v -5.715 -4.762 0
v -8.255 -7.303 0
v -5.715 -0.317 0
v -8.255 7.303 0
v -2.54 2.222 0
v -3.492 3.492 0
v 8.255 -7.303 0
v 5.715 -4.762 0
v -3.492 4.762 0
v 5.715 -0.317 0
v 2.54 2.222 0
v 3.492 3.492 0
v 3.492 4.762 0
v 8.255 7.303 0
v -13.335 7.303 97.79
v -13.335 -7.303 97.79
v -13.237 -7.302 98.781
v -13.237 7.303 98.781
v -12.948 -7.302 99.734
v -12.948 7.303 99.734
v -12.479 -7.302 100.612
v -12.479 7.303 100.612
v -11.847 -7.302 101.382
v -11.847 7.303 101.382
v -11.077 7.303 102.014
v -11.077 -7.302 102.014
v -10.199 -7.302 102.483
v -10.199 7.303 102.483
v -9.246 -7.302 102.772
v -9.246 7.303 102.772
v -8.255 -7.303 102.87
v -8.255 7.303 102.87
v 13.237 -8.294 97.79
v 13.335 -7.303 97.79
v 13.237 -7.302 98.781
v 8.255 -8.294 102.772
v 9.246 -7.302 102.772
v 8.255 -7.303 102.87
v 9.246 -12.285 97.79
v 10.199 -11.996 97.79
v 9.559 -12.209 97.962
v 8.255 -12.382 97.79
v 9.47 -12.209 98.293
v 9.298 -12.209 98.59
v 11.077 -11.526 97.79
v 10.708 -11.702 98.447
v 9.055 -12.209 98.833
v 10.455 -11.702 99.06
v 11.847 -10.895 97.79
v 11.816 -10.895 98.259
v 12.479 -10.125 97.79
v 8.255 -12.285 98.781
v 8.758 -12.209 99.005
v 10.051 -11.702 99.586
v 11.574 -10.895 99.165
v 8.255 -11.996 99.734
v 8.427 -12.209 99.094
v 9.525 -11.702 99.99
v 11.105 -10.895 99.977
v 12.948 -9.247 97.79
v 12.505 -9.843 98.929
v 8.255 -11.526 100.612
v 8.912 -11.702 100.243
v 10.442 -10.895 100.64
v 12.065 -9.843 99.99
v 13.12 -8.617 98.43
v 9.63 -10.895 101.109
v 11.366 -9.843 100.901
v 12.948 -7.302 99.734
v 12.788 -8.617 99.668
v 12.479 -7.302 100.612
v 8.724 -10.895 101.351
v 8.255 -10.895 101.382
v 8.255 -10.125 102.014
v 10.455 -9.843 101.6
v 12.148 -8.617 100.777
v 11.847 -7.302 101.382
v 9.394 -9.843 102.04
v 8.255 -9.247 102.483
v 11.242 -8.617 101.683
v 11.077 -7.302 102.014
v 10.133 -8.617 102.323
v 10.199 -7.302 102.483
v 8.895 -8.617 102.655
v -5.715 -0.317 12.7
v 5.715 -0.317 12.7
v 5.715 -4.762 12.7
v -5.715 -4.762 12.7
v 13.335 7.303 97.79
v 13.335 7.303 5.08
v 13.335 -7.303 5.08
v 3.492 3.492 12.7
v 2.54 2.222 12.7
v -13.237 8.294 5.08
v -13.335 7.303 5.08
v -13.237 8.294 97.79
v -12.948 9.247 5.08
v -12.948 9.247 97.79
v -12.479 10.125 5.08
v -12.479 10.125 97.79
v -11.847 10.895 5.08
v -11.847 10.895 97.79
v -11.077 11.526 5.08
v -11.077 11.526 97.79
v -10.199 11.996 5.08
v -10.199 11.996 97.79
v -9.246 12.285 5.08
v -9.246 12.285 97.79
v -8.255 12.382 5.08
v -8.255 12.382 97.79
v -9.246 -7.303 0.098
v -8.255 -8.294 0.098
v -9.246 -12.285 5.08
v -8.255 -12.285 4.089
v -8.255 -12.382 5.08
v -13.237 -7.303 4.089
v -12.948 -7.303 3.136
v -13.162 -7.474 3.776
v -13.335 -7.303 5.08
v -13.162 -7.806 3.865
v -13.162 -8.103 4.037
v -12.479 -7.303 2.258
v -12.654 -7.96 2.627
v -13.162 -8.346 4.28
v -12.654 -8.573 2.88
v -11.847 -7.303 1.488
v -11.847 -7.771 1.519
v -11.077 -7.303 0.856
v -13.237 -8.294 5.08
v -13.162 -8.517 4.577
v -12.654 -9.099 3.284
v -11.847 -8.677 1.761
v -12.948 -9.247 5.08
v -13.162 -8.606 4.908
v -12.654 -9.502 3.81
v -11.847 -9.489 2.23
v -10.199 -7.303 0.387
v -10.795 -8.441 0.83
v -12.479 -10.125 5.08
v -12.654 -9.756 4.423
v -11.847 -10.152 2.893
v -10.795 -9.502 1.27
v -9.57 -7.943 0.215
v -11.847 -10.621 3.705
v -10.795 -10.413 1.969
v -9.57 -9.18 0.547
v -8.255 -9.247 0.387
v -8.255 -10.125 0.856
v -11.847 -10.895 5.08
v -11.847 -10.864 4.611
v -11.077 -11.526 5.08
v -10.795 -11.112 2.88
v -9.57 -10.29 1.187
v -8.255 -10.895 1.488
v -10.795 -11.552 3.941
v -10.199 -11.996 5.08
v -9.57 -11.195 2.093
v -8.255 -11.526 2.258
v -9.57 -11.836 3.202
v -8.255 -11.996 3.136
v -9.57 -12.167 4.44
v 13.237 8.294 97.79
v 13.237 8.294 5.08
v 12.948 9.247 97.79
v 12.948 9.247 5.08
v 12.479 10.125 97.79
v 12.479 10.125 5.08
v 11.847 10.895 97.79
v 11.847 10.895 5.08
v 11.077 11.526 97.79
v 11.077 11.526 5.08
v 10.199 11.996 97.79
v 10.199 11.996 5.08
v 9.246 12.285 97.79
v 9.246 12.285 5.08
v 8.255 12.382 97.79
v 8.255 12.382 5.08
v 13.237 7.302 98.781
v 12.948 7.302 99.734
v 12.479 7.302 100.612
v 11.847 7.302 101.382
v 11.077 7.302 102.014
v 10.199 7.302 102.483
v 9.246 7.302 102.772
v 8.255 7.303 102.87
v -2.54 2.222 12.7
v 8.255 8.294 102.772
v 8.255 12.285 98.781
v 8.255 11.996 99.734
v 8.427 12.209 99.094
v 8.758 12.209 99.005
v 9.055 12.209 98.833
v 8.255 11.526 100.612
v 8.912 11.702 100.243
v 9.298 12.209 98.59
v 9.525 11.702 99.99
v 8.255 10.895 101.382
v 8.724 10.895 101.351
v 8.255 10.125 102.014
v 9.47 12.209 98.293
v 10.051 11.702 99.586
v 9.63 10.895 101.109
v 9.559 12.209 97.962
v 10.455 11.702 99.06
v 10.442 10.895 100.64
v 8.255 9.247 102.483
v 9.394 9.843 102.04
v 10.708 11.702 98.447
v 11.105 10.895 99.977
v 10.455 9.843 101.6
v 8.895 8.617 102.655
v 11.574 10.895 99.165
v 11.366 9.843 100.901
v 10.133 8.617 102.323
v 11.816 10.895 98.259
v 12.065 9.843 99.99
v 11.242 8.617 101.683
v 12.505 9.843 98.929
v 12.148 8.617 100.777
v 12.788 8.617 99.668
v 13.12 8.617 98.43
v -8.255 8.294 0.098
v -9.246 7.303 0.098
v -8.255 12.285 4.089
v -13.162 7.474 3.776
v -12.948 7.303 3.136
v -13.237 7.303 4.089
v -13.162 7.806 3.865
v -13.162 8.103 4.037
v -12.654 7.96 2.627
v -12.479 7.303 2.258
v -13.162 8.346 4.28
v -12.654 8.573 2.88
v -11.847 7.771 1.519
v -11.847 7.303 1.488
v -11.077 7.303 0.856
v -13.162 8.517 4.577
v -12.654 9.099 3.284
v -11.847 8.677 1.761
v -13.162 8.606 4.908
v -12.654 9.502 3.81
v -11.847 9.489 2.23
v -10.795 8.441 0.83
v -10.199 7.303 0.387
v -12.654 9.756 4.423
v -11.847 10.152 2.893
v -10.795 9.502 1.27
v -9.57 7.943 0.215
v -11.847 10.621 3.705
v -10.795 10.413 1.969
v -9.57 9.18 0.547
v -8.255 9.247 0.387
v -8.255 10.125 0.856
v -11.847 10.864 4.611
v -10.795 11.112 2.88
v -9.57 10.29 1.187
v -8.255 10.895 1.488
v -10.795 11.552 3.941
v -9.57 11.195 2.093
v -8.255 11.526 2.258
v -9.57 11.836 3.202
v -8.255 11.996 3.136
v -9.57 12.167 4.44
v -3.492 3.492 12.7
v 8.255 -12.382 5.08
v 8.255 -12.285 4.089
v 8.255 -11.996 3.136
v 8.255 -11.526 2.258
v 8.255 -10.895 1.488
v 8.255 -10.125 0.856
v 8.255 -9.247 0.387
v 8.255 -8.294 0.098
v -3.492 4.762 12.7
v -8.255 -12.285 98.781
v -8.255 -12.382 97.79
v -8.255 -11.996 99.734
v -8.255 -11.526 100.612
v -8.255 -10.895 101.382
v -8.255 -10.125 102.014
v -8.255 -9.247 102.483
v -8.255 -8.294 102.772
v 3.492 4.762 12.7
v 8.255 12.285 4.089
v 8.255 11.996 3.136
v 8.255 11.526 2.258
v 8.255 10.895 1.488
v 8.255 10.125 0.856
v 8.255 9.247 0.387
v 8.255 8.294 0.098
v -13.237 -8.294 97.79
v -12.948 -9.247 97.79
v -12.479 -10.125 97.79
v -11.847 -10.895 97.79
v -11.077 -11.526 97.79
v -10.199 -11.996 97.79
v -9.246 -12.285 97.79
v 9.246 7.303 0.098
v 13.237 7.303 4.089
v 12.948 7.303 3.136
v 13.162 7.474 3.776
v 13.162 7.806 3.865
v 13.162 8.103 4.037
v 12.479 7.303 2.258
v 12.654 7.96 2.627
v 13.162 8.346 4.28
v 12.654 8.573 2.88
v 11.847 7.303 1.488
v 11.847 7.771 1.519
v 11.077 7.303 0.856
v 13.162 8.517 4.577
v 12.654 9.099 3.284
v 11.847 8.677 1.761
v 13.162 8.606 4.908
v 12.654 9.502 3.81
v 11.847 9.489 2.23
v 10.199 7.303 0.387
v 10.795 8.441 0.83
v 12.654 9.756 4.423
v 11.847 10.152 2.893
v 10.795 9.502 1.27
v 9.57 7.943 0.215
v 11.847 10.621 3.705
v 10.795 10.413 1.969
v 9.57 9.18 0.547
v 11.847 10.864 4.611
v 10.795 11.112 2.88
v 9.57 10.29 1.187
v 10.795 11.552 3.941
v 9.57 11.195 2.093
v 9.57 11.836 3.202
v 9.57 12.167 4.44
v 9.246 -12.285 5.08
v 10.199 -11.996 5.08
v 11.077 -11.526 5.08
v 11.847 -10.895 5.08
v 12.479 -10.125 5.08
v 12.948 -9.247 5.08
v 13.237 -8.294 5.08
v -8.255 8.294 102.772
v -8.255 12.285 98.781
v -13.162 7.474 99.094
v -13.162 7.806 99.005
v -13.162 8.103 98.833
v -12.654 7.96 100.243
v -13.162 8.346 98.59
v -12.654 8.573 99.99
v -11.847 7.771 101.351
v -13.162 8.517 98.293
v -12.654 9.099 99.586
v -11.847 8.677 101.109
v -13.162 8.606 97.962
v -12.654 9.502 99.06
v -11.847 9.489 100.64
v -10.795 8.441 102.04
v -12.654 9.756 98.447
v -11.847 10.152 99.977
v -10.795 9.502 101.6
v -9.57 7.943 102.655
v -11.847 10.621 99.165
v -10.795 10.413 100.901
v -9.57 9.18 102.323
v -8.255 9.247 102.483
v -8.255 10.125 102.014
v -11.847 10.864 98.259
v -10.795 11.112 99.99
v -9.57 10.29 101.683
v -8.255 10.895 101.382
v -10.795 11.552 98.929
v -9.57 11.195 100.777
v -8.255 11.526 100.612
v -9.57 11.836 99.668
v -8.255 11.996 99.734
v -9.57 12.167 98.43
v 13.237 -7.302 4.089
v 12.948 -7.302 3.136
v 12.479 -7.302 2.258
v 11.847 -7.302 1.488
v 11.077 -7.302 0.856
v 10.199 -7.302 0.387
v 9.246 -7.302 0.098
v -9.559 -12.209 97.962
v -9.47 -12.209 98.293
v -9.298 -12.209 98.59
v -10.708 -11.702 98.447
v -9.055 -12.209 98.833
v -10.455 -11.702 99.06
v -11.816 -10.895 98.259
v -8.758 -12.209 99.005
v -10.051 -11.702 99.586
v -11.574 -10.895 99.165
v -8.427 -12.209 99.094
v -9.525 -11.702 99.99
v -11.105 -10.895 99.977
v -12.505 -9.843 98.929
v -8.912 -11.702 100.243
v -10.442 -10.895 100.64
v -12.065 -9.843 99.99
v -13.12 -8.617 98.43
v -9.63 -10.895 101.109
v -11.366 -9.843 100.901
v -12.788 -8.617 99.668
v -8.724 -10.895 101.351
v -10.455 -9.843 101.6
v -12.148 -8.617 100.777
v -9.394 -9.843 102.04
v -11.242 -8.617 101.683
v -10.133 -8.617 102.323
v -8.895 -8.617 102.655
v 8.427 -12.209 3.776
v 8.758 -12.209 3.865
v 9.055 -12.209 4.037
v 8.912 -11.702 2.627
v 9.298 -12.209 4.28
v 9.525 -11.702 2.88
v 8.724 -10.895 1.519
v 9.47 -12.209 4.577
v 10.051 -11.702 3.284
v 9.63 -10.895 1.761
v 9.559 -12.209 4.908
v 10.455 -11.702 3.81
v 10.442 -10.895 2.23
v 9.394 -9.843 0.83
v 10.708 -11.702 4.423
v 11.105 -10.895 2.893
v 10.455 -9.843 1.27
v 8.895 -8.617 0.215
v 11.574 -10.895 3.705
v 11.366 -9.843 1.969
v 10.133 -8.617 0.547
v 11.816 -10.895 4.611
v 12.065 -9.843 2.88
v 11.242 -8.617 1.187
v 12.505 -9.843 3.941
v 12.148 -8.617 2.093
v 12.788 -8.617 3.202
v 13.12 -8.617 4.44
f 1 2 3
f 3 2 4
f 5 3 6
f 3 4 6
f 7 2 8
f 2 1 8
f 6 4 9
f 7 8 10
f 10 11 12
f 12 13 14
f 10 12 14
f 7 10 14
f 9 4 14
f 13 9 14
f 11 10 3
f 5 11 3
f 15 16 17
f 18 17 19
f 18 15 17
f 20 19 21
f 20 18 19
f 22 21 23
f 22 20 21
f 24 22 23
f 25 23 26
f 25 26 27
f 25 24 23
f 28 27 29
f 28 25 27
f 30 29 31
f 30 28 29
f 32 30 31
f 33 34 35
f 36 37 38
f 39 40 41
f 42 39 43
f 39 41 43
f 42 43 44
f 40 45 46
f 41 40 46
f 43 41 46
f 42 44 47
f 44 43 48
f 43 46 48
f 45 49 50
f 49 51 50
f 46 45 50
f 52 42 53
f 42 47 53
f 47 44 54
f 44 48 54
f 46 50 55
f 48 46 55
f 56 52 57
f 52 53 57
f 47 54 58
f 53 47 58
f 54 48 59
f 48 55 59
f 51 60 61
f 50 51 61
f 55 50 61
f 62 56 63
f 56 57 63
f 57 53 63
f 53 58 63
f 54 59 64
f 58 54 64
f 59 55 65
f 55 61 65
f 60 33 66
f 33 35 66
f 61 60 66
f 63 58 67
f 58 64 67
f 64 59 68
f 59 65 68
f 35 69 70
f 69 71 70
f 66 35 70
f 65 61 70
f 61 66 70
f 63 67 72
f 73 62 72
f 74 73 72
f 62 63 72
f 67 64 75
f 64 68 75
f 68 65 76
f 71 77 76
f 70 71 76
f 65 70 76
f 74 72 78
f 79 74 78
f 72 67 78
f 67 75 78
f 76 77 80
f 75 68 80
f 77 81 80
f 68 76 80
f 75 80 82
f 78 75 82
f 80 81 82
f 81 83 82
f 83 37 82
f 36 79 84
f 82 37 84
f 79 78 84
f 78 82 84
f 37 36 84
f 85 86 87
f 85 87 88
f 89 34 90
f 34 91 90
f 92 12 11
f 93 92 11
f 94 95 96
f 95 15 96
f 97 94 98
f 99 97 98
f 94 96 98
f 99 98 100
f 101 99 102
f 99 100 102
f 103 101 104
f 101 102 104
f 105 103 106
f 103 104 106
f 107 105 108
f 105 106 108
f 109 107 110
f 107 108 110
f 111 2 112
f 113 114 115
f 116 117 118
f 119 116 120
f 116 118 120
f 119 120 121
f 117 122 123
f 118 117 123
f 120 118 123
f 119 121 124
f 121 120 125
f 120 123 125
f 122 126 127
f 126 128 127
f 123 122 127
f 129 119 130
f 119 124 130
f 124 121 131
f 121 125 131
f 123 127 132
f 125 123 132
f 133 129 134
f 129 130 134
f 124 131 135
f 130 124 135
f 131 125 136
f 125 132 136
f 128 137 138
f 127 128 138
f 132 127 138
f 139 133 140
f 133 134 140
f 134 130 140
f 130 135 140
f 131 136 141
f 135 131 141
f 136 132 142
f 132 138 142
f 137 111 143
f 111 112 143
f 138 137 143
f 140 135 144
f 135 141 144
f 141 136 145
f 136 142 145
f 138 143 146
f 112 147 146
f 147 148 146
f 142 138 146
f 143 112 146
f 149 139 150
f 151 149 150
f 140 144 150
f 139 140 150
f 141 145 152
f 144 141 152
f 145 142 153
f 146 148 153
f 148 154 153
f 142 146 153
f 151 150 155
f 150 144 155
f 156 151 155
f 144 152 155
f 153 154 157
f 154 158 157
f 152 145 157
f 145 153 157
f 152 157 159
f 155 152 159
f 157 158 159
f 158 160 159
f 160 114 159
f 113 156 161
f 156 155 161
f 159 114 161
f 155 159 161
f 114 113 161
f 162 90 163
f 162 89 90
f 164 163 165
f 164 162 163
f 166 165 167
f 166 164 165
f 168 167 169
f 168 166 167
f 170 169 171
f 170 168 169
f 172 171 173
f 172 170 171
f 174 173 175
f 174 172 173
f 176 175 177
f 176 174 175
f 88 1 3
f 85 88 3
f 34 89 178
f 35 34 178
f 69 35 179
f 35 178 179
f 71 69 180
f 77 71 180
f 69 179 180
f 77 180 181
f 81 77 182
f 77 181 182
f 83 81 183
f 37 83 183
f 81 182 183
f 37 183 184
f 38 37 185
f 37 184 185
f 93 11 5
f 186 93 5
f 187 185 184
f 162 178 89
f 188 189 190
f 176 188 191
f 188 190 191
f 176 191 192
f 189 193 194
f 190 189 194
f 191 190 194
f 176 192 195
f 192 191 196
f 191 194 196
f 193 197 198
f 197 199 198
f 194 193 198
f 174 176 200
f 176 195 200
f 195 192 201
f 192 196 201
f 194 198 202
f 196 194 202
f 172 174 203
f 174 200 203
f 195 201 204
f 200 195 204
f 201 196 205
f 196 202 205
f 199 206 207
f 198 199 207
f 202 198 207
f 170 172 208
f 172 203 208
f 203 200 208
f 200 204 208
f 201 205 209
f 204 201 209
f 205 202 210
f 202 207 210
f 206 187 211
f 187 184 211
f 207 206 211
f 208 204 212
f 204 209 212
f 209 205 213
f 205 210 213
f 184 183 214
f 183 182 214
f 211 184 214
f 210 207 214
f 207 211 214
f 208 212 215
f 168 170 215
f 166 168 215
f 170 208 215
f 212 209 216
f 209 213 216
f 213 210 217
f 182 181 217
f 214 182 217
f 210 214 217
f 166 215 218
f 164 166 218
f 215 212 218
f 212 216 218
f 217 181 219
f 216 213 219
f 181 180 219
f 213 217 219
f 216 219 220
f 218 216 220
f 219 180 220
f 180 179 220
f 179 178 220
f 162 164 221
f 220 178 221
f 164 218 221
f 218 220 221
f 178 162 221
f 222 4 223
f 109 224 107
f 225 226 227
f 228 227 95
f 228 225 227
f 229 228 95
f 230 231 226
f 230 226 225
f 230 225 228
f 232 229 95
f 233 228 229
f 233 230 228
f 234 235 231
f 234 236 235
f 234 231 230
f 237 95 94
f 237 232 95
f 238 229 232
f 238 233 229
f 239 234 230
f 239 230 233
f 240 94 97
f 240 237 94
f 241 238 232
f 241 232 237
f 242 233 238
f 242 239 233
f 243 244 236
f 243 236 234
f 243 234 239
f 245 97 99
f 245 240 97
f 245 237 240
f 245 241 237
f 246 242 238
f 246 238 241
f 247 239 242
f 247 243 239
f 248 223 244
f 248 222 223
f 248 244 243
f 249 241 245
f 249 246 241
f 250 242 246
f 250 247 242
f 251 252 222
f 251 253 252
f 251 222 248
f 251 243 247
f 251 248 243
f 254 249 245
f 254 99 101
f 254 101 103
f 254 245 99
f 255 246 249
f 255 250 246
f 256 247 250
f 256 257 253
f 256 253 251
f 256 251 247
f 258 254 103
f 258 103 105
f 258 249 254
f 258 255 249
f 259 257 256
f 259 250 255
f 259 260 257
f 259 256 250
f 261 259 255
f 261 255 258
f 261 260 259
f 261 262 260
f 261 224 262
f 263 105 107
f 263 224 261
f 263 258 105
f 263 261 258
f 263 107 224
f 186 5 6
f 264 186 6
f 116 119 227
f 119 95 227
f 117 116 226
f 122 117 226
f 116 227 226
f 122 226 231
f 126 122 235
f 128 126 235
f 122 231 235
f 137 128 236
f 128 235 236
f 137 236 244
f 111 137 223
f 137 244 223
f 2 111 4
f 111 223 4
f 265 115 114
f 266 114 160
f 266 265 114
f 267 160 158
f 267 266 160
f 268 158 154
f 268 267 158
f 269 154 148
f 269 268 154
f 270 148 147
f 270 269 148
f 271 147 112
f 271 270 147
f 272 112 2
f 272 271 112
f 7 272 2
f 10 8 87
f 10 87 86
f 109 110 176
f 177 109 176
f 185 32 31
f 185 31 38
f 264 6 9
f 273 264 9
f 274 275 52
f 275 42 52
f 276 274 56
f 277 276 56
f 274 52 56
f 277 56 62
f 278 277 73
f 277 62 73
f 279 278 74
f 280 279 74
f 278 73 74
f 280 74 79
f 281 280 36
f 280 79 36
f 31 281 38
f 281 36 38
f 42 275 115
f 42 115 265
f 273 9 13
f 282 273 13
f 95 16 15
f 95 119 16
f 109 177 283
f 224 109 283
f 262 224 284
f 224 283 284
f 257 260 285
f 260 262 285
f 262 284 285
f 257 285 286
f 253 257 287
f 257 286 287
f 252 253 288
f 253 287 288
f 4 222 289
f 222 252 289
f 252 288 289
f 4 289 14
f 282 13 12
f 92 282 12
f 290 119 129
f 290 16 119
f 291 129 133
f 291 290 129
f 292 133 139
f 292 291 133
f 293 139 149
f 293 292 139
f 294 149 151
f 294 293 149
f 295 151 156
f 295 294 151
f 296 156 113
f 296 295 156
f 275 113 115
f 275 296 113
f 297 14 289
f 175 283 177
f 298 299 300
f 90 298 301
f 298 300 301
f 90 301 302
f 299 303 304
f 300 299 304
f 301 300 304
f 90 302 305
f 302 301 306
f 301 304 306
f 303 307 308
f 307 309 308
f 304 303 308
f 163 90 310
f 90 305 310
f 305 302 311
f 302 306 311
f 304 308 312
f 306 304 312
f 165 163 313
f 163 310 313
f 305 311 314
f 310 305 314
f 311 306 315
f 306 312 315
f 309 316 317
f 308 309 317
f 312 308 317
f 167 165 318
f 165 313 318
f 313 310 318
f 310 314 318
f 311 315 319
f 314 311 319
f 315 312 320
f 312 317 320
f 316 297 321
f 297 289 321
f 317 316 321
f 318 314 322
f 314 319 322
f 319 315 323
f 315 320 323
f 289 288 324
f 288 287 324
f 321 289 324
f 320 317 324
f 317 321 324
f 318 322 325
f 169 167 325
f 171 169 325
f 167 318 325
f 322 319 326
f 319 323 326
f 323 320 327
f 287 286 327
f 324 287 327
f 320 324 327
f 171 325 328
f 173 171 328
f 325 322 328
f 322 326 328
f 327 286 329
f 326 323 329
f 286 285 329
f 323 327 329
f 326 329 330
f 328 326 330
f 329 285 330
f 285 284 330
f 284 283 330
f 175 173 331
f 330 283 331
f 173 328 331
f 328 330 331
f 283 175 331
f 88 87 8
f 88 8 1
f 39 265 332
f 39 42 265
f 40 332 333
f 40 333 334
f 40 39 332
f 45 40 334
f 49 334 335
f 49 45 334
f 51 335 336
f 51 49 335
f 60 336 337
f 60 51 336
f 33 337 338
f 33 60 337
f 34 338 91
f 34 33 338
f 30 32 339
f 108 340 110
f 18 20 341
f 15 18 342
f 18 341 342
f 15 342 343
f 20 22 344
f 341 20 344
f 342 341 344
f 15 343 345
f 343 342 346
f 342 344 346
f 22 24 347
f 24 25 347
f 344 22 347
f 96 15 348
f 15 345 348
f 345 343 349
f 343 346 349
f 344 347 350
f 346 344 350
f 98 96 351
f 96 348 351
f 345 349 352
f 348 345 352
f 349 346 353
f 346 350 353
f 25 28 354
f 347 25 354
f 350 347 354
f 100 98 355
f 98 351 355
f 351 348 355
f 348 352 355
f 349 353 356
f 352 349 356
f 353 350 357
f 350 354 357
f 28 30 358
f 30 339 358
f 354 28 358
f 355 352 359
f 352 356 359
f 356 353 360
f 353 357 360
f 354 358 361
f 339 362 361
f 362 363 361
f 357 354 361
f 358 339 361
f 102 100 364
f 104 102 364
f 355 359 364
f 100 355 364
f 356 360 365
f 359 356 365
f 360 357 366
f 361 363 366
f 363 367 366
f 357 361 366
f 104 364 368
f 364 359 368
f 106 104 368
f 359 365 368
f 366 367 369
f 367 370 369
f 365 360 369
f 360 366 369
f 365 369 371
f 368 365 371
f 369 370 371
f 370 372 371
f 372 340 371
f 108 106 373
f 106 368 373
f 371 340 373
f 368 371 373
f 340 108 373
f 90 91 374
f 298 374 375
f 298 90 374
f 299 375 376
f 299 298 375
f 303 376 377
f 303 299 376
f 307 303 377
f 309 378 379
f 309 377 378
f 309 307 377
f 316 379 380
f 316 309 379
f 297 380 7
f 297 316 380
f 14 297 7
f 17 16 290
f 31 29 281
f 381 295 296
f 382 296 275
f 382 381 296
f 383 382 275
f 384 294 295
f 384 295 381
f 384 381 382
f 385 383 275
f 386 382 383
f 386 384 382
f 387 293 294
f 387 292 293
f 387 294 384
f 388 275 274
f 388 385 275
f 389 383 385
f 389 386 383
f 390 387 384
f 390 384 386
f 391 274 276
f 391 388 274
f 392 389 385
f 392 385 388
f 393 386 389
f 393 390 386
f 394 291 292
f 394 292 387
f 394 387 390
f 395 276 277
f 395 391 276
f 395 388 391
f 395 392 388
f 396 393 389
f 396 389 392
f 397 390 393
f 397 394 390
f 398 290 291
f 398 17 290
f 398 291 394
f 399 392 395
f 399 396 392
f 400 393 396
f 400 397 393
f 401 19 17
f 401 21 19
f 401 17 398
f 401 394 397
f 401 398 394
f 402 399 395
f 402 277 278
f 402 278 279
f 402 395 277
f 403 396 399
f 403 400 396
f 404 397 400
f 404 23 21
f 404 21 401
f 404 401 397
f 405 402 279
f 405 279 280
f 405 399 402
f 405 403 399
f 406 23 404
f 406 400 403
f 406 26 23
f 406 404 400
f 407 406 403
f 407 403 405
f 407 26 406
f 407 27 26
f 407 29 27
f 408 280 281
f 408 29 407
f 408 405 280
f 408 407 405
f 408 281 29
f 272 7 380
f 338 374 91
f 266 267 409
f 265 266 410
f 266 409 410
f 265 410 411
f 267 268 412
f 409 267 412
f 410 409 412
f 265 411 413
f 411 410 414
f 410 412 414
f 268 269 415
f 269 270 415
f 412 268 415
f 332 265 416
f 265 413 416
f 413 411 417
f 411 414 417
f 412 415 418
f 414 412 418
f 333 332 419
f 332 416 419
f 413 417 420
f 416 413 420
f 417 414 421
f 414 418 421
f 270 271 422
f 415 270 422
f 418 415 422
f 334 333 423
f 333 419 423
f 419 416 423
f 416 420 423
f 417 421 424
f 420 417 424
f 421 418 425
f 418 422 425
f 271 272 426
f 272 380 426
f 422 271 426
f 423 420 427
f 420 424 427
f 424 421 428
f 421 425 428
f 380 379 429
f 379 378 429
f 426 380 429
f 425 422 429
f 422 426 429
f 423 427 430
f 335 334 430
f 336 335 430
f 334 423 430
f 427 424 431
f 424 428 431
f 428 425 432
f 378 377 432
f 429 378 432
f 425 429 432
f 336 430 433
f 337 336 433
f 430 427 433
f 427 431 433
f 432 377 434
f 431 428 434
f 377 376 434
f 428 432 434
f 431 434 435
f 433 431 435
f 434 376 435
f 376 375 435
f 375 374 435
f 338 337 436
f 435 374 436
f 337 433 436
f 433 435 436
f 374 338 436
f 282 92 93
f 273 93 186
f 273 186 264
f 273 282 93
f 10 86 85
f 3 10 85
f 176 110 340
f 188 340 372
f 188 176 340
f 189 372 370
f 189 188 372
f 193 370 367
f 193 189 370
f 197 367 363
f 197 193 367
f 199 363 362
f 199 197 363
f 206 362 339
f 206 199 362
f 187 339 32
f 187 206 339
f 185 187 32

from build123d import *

# Parameters (mm, degrees)
SKETCH1_W           = 26.67
SKETCH1_H           = 24.765
BOSS_EXTRUDE1_DEPTH = 102.87
FILLET1_R           = 5.08
SKETCH2_W           = 11.43
SKETCH2_H           = 4.445
CUT_EXTRUDE1_DEPTH  = 12.7


with BuildPart() as part:
    # Sketch1 → Boss-Extrude1 (new body)
    with BuildSketch(Plane.XY):
        Rectangle(SKETCH1_W, SKETCH1_H)
    extrude(amount=BOSS_EXTRUDE1_DEPTH)

    # Fillet1
    fillet1_edges = [part.edges().sort_by_distance(p)[0] for p in [
        (13.335, 0, 102.87),
        (0, 12.3825, 102.87),
        (-13.335, 0, 102.87),
        (0, 12.3825, 0),
        (13.335, 0, 0),
        (0, -12.3825, 0),
        (-13.335, 0, 0),
        (-13.335, 12.3825, 51.435),
        (13.335, 12.3825, 51.435),
        (13.335, -12.3825, 51.435),
        (-13.335, -12.3825, 51.435),
        (0, -12.3825, 102.87),
    ]]
    fillet(fillet1_edges, radius=FILLET1_R)

    # Sketch2 → Cut-Extrude1 (cut)
    with BuildSketch(Plane(origin=(0, 0, 0), x_dir=(-1, 0, 0), z_dir=(0, 0, -1))):
        with Locations((0, -2.54)):
            Rectangle(SKETCH2_W, SKETCH2_H)
        Polygon((-2.54, 2.2225), (2.54, 2.2225), (3.4925, 3.4925), (3.4925, 4.7625), (-3.4925, 4.7625), (-3.4925, 3.4925), align=None)
    extrude(amount=-CUT_EXTRUDE1_DEPTH, mode=Mode.SUBTRACT)


solid = part.part
